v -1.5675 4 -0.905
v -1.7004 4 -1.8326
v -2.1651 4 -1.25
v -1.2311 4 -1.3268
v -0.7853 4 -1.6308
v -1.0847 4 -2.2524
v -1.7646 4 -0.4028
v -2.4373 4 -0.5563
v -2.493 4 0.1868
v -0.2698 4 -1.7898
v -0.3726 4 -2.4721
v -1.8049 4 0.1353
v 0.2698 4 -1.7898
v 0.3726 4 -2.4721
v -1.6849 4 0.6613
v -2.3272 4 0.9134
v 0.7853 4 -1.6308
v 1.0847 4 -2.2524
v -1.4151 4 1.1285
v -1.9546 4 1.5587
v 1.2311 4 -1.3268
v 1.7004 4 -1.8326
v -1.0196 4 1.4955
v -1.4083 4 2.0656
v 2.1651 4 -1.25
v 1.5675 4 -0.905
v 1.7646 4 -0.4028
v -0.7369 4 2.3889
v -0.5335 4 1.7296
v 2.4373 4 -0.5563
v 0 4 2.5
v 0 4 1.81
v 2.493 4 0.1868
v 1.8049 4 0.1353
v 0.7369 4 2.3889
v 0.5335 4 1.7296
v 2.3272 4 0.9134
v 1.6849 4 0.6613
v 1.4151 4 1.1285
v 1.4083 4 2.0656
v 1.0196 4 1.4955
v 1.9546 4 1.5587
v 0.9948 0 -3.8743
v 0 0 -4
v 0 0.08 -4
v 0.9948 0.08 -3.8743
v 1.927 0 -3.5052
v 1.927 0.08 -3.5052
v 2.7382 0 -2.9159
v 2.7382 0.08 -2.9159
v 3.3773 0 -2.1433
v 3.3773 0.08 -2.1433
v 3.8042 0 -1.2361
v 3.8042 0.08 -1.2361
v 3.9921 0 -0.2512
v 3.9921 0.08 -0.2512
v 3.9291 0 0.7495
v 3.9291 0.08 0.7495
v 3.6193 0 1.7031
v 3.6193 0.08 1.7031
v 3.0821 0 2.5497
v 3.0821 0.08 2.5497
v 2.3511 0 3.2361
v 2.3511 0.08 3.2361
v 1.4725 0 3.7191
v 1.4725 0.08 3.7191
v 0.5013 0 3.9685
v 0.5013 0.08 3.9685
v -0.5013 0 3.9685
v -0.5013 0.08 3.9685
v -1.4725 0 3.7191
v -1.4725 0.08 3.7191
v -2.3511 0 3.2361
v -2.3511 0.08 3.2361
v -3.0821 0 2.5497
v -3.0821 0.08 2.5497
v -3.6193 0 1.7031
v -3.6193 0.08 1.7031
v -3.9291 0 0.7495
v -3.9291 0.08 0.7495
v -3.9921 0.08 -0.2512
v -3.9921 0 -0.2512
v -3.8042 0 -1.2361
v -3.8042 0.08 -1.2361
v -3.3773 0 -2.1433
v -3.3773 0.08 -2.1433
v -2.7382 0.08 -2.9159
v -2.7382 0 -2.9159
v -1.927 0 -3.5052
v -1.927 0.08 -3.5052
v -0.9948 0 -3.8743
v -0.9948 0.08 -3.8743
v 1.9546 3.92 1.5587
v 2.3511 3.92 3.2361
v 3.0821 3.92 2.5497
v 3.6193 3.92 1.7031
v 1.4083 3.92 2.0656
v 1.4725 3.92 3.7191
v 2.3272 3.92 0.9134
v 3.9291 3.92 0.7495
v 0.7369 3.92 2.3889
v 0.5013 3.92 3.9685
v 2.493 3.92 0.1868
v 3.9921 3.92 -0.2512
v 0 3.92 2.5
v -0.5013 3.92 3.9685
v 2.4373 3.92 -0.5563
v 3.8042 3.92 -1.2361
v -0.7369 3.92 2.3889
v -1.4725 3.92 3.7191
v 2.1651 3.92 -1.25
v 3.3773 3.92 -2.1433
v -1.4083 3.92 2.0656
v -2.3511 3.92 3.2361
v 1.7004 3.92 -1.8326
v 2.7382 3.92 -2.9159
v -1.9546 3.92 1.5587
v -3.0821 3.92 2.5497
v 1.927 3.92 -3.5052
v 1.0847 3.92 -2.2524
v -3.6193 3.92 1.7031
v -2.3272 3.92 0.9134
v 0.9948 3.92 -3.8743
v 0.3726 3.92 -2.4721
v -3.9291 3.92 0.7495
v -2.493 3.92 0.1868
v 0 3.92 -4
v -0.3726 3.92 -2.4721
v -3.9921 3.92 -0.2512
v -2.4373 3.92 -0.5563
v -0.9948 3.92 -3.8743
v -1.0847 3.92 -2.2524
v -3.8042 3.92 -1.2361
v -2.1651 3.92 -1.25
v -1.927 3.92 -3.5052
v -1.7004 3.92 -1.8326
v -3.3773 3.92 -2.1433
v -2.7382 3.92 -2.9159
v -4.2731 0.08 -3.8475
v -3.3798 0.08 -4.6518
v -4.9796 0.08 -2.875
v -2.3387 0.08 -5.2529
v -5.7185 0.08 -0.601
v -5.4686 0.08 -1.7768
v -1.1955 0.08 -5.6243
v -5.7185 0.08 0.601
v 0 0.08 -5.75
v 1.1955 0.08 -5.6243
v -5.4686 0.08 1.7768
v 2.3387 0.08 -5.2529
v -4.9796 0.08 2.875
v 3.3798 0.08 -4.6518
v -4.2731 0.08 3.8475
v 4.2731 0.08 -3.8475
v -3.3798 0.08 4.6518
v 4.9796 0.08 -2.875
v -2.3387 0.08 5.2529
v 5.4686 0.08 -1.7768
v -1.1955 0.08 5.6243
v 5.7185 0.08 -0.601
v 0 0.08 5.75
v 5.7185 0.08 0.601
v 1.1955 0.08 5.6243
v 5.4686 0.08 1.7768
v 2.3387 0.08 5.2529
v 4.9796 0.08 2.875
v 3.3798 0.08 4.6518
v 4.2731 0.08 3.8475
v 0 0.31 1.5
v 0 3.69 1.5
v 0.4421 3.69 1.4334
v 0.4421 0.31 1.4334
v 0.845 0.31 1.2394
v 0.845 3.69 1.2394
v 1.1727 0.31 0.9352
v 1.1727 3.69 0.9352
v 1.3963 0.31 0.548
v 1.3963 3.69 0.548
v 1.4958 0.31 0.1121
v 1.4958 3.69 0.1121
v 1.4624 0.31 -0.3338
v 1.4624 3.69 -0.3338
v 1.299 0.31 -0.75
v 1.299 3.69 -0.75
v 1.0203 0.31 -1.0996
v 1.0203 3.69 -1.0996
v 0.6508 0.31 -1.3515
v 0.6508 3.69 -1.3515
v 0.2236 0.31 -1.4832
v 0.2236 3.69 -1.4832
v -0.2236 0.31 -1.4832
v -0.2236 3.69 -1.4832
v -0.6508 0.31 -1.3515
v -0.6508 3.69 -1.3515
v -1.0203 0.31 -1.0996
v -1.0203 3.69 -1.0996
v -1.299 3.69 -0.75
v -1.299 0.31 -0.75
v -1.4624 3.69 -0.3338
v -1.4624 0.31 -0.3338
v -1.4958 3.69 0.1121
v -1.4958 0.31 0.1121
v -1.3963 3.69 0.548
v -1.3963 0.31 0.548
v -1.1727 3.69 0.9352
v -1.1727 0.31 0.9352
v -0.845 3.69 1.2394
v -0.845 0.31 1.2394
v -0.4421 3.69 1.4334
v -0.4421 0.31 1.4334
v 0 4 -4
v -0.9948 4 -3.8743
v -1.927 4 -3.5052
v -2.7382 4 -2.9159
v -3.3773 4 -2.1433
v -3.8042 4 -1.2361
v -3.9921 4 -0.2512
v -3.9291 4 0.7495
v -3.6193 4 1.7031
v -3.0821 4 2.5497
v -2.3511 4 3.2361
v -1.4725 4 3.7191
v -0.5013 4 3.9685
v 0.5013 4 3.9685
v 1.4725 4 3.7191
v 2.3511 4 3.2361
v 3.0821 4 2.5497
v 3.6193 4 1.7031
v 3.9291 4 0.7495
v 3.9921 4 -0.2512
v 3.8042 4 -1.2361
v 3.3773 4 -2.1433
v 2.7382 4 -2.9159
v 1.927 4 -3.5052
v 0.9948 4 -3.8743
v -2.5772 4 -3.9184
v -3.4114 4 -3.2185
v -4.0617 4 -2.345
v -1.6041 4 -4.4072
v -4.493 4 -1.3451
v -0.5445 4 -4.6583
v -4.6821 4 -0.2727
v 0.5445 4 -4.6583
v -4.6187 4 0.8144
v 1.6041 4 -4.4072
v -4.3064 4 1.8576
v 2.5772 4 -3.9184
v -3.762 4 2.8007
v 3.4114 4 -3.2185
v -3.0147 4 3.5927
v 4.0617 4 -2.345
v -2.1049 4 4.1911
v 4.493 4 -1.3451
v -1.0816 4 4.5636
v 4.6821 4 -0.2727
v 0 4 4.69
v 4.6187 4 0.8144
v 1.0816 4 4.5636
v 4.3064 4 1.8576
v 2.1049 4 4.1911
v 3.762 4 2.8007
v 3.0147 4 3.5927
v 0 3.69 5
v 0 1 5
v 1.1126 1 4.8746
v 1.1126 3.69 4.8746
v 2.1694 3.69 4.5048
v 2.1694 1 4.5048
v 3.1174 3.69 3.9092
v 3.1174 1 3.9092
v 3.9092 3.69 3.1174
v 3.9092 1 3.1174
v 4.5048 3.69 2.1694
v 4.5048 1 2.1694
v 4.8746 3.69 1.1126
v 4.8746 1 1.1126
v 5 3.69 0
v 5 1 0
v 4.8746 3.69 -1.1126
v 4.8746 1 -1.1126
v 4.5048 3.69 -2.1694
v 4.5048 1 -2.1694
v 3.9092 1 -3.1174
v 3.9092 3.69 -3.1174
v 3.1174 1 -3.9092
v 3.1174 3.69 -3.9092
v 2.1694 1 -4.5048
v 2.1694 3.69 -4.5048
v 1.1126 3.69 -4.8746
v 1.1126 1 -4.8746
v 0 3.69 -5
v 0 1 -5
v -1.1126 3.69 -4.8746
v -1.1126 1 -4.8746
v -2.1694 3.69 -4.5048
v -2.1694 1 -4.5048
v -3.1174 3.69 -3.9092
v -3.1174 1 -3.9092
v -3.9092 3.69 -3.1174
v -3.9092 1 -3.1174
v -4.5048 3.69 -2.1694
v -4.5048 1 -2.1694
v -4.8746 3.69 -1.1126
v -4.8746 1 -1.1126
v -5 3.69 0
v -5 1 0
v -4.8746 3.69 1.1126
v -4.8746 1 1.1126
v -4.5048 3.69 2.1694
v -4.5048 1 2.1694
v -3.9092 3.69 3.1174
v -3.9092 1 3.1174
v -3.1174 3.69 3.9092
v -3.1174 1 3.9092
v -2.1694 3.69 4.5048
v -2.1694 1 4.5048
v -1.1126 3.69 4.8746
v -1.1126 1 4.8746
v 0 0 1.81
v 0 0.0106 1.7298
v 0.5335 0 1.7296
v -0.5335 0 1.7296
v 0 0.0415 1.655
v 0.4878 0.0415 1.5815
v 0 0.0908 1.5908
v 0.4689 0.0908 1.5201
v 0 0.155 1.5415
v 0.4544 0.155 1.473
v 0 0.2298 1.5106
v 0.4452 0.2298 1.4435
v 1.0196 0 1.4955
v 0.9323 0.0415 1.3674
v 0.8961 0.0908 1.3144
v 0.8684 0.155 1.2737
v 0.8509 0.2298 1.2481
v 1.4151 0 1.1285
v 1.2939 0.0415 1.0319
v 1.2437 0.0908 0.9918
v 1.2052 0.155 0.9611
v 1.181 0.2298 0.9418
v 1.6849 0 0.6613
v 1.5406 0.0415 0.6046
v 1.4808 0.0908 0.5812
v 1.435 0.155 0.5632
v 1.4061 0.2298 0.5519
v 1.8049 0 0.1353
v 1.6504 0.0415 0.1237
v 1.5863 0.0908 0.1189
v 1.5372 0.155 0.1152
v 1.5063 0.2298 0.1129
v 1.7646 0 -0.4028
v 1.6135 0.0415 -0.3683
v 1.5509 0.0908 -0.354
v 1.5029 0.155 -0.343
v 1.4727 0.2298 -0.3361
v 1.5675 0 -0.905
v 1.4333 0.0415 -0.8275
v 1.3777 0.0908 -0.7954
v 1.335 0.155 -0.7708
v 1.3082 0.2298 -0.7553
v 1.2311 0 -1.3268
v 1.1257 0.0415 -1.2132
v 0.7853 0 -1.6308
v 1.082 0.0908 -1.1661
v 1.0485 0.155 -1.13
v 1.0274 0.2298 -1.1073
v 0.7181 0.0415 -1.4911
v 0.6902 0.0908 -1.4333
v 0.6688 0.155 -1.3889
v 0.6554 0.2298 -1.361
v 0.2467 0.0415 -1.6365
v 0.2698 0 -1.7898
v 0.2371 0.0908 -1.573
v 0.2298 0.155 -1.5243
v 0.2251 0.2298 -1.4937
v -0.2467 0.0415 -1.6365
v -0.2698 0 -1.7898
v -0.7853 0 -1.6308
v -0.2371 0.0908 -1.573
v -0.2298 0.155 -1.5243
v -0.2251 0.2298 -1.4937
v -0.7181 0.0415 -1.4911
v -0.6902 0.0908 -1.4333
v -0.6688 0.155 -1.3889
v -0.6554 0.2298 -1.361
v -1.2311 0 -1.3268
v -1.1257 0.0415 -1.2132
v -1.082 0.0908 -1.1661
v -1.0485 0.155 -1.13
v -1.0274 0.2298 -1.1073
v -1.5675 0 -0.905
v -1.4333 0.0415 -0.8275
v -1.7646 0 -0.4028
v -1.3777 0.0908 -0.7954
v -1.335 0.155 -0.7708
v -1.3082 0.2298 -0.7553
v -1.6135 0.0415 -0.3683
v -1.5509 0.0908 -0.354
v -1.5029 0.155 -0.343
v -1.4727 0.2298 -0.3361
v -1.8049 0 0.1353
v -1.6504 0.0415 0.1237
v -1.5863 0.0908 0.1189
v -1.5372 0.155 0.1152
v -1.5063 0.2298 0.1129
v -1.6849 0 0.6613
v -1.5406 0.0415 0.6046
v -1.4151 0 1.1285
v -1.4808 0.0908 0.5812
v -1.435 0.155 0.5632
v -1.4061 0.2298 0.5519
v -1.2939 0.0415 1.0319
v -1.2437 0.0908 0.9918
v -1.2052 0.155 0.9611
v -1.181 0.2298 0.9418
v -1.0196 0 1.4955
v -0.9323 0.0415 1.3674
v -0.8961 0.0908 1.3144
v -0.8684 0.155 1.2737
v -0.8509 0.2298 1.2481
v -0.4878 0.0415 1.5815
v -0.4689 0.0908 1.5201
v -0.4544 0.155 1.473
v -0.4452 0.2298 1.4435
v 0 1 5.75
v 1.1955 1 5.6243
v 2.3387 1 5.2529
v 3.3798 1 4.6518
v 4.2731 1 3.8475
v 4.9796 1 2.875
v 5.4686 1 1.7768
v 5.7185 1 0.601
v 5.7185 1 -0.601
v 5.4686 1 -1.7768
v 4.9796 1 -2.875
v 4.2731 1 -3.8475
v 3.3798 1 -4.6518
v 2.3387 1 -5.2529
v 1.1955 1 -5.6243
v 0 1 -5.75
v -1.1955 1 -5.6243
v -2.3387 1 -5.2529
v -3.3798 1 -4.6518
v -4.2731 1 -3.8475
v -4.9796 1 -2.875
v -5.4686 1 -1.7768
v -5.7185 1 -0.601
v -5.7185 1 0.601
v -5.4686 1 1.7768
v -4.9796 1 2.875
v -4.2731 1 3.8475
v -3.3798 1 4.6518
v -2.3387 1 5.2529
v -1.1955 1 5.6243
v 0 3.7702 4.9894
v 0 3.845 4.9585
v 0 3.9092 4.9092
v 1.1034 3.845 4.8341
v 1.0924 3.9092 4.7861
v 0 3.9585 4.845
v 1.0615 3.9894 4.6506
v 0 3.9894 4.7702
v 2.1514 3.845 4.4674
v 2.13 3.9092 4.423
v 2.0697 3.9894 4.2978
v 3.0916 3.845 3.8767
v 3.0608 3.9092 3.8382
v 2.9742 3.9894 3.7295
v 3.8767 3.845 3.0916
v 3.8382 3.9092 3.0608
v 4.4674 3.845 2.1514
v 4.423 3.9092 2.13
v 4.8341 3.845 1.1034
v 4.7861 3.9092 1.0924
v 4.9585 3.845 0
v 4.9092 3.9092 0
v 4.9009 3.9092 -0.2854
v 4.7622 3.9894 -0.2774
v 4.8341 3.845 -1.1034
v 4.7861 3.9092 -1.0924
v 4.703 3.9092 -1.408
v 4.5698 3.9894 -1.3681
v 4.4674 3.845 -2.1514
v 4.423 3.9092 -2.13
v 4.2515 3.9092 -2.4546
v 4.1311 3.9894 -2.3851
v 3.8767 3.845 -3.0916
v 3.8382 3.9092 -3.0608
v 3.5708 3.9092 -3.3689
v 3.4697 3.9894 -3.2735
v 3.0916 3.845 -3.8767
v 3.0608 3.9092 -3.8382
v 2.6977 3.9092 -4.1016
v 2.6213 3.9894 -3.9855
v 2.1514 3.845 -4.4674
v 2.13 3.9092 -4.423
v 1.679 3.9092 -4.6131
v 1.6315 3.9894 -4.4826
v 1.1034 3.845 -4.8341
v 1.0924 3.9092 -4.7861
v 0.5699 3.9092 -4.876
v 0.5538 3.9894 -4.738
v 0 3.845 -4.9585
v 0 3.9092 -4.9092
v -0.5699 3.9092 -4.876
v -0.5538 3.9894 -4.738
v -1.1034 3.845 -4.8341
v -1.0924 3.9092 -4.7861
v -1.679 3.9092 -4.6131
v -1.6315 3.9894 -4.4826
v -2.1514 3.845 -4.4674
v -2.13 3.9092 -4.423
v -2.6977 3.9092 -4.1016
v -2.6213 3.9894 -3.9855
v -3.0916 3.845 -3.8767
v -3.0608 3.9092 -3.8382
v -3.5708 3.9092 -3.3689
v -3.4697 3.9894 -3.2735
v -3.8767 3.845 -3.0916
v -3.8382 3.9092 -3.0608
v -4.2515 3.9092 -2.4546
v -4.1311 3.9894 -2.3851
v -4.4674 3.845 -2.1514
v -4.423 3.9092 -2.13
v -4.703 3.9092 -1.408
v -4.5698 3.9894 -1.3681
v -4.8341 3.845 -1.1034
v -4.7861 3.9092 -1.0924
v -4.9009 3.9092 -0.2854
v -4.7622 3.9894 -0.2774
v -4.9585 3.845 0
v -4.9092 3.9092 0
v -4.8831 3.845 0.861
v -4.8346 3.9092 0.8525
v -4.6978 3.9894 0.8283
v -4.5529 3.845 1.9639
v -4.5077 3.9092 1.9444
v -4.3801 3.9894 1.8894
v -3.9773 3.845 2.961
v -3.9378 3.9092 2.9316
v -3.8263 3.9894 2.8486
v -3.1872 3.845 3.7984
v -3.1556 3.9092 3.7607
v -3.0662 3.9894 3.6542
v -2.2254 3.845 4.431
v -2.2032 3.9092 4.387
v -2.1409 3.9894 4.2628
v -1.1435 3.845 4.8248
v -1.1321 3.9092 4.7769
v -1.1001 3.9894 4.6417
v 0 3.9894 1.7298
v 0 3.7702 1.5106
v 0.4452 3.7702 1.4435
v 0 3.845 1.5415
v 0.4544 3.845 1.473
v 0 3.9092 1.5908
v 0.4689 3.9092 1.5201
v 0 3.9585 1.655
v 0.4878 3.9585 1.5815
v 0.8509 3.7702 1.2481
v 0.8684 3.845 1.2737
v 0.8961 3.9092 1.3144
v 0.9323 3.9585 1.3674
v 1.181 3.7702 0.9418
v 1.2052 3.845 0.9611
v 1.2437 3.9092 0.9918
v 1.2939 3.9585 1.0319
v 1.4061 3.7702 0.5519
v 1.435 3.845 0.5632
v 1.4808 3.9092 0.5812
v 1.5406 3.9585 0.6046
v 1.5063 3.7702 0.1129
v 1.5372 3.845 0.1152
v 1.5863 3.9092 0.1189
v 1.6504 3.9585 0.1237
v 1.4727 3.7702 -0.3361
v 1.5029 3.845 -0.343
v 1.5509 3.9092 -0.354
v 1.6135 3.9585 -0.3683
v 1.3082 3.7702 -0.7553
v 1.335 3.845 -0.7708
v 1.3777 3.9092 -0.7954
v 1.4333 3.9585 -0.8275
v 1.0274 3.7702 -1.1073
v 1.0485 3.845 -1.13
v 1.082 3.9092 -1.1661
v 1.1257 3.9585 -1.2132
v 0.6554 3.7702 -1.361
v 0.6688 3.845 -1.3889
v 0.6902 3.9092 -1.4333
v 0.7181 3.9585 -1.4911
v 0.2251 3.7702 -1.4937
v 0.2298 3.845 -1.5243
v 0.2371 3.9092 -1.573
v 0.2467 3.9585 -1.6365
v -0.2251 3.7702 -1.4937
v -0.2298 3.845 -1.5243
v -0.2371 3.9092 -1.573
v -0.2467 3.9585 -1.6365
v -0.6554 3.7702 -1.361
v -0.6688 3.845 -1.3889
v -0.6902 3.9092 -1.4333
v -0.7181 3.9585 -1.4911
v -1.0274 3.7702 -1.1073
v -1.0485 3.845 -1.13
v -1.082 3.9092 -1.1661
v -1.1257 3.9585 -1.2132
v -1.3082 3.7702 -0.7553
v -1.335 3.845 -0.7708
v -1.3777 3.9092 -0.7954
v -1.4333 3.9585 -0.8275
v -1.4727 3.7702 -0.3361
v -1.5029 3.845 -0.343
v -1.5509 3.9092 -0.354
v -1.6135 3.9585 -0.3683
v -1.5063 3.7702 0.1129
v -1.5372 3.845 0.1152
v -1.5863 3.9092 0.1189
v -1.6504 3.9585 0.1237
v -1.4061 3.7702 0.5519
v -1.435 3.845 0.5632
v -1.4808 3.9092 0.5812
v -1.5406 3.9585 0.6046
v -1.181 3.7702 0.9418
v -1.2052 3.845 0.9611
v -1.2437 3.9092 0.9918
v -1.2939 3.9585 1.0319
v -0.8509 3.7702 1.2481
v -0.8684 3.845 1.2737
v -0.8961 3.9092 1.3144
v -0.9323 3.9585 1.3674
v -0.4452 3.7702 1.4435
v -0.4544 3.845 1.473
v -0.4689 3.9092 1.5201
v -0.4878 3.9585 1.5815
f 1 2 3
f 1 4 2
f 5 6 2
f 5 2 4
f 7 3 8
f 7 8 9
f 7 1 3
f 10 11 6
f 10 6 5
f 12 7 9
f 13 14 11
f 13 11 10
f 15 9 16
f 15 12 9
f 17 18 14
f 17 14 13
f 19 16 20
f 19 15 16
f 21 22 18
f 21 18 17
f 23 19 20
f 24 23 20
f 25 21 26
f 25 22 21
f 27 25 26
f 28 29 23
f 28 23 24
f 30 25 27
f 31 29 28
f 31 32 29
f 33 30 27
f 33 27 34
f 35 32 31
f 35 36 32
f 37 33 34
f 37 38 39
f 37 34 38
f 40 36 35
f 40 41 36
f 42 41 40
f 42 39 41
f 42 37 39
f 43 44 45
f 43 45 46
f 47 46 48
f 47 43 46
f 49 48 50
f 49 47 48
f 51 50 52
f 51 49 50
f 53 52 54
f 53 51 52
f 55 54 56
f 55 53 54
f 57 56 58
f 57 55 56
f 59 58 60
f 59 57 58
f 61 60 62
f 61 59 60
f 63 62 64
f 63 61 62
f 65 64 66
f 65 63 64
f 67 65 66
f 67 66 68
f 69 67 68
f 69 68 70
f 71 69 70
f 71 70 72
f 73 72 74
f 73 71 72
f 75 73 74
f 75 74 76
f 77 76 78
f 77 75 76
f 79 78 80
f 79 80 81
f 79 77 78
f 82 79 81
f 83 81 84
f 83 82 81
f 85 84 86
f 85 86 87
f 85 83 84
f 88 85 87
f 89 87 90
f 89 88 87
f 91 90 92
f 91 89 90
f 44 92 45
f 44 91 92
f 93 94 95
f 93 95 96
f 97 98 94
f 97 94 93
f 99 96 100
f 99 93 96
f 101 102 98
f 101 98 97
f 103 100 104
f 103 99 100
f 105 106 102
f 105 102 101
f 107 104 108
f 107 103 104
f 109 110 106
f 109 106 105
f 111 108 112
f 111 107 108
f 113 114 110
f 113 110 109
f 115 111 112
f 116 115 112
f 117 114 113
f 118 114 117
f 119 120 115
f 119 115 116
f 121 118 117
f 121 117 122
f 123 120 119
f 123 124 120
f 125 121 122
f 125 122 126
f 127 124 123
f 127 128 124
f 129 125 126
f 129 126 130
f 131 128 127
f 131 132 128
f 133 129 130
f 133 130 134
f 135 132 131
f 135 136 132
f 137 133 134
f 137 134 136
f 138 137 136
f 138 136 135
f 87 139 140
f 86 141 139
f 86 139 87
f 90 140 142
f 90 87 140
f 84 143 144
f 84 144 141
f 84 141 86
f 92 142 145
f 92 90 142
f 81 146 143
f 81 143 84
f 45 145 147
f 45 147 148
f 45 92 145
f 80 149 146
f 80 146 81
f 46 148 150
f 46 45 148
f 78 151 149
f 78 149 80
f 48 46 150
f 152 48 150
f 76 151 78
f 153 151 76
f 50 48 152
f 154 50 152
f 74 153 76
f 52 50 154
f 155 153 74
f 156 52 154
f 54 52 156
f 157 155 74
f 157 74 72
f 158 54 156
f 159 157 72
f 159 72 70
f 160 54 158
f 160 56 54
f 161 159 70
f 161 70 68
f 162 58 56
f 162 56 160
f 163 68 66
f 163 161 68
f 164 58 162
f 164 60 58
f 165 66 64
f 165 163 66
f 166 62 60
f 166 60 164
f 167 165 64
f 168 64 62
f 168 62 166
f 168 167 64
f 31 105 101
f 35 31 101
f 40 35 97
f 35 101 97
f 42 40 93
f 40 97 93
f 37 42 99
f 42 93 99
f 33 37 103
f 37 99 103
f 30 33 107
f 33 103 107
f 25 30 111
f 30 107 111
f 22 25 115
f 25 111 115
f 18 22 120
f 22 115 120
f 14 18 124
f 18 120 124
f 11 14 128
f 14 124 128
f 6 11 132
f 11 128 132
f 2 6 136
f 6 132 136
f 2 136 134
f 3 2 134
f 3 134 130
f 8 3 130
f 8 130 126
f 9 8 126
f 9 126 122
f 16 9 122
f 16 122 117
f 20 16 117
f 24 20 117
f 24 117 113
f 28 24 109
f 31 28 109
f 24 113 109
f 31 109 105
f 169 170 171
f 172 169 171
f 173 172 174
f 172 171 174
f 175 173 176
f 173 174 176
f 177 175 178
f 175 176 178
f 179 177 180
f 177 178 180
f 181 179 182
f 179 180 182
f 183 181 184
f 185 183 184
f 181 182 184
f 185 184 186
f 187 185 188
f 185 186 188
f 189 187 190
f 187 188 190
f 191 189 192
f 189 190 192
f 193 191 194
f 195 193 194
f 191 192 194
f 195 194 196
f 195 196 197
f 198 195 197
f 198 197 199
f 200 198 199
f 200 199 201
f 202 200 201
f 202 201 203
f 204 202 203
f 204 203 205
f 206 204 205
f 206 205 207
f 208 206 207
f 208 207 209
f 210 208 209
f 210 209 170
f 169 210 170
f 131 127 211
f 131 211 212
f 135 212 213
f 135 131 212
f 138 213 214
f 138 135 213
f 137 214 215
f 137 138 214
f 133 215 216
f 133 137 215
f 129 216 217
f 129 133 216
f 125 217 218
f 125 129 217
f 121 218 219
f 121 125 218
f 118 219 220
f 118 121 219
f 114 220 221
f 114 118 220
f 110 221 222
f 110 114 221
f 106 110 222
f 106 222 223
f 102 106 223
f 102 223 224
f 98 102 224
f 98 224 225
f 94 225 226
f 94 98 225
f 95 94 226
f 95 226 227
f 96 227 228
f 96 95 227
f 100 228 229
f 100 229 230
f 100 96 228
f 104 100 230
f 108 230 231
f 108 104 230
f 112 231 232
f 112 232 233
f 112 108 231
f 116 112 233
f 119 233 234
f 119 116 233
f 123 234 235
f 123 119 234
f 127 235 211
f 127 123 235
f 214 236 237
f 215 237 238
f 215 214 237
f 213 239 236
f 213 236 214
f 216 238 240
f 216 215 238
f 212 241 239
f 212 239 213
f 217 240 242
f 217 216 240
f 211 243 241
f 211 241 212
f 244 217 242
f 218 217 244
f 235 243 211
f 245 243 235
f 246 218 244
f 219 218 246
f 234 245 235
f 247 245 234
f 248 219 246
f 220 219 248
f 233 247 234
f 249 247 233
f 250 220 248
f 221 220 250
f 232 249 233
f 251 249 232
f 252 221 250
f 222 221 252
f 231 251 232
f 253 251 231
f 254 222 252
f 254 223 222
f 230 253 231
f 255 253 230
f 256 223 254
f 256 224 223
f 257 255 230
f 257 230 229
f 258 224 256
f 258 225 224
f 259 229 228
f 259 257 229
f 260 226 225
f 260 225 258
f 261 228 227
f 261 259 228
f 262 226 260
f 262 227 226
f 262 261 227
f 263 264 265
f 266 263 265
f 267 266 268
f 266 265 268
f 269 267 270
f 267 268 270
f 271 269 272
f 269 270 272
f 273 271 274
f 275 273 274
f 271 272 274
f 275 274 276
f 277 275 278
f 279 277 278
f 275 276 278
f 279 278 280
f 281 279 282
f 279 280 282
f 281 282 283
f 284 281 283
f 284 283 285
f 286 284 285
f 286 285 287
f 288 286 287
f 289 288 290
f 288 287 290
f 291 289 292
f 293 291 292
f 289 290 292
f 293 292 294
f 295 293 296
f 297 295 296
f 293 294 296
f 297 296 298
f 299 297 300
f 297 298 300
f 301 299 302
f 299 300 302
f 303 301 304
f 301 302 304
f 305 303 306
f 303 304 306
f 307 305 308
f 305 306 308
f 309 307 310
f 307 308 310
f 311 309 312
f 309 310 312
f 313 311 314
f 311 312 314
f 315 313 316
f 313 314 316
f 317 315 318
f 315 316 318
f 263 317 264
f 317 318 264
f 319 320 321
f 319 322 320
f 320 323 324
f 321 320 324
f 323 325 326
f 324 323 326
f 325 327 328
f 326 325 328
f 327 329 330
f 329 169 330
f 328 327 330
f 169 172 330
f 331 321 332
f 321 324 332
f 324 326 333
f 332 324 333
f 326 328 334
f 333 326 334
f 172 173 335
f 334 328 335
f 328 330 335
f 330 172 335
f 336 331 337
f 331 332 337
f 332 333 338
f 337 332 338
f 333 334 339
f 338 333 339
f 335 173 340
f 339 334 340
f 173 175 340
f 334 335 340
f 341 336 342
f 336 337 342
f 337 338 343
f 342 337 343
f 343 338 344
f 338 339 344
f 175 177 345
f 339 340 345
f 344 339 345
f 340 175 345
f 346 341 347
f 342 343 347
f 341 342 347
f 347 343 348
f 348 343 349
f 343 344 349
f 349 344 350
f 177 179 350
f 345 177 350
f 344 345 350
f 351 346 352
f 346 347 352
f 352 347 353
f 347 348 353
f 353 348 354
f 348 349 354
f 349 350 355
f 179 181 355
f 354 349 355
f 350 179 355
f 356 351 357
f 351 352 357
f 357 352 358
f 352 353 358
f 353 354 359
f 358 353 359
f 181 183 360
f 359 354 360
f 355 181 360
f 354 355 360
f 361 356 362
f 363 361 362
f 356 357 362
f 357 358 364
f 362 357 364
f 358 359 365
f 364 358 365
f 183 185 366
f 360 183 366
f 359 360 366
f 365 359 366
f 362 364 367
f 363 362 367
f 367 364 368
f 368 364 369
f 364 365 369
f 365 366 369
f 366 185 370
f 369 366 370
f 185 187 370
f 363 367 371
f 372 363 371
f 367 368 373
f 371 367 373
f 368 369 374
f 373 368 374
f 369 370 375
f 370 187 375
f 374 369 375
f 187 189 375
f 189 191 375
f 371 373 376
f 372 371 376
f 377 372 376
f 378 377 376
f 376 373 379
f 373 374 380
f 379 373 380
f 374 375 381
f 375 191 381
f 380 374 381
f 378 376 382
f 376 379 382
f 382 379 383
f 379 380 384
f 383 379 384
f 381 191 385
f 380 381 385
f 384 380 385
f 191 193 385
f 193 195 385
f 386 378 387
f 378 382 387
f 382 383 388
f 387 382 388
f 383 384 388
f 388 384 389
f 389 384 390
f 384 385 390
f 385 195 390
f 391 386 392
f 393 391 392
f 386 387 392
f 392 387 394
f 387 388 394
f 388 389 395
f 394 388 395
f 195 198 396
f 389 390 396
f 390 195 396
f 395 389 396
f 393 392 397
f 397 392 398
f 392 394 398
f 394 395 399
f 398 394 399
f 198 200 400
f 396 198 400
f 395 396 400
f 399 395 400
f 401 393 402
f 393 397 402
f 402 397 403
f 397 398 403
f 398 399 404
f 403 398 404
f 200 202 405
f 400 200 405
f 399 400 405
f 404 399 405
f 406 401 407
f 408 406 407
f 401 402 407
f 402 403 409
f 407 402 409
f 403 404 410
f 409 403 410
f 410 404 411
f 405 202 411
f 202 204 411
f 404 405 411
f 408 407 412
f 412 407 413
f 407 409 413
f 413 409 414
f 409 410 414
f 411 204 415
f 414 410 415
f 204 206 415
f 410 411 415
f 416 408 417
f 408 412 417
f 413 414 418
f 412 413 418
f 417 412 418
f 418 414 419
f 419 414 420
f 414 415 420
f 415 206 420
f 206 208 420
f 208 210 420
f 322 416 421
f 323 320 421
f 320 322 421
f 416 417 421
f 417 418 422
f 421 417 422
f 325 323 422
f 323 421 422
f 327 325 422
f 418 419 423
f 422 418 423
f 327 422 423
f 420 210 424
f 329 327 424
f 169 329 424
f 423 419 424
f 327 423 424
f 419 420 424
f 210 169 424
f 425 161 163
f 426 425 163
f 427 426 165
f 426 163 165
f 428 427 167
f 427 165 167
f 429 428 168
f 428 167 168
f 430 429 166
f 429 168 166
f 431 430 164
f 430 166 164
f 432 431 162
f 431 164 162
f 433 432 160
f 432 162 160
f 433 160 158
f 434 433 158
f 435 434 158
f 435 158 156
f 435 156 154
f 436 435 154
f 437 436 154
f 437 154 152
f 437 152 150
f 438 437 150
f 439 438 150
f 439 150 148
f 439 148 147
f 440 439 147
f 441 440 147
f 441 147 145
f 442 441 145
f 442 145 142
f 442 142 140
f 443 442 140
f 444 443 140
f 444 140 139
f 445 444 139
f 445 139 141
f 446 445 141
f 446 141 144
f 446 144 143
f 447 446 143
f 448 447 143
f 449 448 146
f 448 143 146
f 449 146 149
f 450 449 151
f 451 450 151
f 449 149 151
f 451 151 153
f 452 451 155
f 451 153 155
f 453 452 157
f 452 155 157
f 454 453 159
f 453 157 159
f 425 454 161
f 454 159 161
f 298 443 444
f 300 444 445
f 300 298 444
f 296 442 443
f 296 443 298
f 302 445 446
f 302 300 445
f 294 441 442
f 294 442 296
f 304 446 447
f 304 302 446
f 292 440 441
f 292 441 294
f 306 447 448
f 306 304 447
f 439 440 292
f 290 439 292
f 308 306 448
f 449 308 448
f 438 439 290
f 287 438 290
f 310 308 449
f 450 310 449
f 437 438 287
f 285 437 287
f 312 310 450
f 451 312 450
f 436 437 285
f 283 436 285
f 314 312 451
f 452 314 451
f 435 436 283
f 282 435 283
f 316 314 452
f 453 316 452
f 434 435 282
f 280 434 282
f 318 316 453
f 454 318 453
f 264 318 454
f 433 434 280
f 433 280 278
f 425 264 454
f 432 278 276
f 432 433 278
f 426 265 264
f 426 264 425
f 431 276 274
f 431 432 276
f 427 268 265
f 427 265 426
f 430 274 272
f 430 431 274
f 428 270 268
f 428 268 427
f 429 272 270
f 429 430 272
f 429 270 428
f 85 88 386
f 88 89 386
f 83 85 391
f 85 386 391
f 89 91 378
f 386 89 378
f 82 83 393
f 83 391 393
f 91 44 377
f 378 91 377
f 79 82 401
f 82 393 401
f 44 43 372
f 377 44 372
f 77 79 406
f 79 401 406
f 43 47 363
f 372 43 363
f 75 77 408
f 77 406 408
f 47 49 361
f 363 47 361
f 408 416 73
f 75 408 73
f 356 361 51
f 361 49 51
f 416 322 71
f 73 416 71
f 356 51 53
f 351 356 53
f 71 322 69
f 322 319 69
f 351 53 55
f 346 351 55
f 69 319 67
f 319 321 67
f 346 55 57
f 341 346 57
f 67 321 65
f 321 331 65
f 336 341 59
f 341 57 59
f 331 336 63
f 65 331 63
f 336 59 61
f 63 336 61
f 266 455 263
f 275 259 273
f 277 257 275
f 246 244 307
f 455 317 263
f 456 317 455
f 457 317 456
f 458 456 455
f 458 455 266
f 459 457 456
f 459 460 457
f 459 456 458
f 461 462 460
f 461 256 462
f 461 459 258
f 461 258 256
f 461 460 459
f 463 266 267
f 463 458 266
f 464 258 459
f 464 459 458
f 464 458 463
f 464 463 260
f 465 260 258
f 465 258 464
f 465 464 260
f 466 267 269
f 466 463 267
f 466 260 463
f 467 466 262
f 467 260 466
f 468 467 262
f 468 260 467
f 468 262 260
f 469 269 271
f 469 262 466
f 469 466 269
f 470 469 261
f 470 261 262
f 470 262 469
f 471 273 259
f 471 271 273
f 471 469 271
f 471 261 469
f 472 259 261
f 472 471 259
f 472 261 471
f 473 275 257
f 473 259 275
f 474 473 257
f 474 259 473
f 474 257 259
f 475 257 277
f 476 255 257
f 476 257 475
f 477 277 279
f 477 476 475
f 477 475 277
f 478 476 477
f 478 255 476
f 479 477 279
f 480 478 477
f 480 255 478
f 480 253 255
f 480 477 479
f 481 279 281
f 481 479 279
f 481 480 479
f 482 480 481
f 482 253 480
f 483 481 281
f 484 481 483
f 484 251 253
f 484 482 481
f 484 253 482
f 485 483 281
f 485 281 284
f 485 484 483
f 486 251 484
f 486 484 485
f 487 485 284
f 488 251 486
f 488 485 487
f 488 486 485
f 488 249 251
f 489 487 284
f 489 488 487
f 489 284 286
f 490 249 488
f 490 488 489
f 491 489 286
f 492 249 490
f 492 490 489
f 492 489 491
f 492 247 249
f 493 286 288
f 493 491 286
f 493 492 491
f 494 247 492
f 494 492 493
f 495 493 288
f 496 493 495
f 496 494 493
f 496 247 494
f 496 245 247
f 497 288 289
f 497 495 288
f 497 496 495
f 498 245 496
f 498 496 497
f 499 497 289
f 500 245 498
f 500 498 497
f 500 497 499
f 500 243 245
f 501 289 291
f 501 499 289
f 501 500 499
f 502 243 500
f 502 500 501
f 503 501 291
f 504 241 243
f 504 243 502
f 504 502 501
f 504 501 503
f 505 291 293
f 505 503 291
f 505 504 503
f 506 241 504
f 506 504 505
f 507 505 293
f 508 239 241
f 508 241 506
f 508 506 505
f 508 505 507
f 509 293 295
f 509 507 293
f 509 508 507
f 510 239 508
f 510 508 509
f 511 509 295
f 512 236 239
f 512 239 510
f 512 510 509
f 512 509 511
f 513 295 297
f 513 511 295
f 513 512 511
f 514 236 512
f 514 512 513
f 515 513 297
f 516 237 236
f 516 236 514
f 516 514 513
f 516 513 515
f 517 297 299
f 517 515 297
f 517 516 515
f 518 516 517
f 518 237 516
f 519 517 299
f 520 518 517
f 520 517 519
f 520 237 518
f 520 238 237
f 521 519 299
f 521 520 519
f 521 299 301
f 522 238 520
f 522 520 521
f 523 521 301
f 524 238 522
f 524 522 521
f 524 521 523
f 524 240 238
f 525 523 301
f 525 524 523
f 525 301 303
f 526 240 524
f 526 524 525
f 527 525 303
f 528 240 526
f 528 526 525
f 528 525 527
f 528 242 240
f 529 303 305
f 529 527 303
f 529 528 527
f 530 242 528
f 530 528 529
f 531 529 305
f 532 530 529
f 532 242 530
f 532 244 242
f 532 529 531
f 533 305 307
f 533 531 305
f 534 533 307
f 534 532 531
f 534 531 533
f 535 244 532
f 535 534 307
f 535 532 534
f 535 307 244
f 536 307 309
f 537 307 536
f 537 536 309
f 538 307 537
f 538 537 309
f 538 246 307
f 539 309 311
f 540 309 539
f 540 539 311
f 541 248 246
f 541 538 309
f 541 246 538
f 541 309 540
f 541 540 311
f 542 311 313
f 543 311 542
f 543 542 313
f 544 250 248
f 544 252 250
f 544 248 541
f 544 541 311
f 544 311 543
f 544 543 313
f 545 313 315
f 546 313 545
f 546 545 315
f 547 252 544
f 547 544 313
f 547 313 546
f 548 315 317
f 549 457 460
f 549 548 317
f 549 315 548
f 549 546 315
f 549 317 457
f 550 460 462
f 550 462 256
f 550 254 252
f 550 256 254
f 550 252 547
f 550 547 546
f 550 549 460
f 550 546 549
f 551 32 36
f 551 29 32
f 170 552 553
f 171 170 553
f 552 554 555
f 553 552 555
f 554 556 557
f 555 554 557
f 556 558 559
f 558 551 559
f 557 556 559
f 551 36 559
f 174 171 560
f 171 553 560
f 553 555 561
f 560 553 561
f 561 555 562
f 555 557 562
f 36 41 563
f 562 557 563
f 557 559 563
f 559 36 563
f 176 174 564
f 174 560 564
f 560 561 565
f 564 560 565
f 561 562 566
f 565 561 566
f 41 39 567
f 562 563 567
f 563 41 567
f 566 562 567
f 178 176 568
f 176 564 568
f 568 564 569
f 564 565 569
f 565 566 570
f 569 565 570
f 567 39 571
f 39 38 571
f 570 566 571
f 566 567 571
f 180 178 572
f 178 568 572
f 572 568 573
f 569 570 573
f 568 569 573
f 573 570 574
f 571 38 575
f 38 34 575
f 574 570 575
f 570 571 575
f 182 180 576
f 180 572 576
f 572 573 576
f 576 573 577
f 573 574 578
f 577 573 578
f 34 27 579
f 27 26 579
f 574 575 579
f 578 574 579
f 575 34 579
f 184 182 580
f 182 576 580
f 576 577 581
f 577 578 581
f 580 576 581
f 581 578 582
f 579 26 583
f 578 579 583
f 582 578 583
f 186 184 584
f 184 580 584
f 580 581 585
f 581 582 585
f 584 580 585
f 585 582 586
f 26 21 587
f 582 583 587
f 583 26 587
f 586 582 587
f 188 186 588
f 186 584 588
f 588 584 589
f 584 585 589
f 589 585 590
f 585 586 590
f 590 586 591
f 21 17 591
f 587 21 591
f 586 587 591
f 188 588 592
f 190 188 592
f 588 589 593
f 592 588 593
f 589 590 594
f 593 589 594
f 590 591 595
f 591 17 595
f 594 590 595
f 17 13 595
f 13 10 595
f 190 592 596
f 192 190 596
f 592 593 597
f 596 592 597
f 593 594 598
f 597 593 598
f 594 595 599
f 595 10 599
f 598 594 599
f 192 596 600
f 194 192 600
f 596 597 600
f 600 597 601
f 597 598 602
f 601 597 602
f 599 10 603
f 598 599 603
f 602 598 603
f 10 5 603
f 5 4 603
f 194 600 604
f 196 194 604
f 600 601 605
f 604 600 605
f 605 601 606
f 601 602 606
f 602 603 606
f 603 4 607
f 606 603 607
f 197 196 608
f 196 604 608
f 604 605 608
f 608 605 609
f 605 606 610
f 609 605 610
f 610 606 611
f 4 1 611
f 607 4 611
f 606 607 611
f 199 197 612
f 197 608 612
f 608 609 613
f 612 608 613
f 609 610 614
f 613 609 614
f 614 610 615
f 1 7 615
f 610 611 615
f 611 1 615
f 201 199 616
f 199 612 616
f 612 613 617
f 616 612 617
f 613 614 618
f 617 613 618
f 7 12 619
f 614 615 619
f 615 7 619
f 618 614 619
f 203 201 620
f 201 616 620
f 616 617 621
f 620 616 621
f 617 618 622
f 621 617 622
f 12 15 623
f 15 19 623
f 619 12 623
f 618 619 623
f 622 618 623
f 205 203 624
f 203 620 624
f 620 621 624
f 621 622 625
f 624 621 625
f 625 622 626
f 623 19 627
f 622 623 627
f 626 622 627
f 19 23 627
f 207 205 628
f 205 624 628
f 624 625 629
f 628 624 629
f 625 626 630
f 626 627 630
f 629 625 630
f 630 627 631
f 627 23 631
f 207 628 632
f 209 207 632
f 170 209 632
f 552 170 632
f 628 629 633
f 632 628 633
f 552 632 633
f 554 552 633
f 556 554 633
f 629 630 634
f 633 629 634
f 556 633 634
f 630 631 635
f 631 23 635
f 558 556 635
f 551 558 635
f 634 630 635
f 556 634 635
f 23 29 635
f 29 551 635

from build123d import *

# Parameters (mm, degrees)
SKETCH1_R           = 5.75
BOSS_EXTRUDE1_DEPTH = 1
SKETCH2_R           = 5
BOSS_EXTRUDE2_DEPTH = 3
SKETCH3_R           = 1.5
CUT_EXTRUDE1_DEPTH  = 10.06228448
SKETCH4_R           = 762
SKETCH4_R_2         = 4
CUT_EXTRUDE2_DEPTH  = 0.08
CUT_EXTRUDE3_START  = -0.08
SKETCH5_R           = 4
SKETCH5_R_2         = 2.5
CUT_EXTRUDE3_DEPTH  = 0.08
FILLET1_R           = 0.31


with BuildPart() as part:
    # Sketch1 → Boss-Extrude1 (new body)
    with BuildSketch(Plane(origin=(0, 0, 0), x_dir=(1, 0, 0), z_dir=(0, 1, 0))):
        with Locations(Location((0, 0, 0), (0, 0, 270))):
            Circle(SKETCH1_R)
    extrude(amount=BOSS_EXTRUDE1_DEPTH)

    # Sketch2 → Boss-Extrude2 (add)
    with BuildSketch(Plane(origin=(0, 1, 0), x_dir=(1, 0, 0), z_dir=(0, 1, 0))):
        with Locations(Location((0, 0, 0), (0, 0, 270))):
            Circle(SKETCH2_R)
    extrude(amount=BOSS_EXTRUDE2_DEPTH)

    # Sketch3 → Cut-Extrude1 (cut, through all)
    with BuildSketch(Plane(origin=(0, 4, 0), x_dir=(1, 0, 0), z_dir=(0, 1, 0))):
        with Locations(Location((0, 0, 0), (0, 0, 270))):
            Circle(SKETCH3_R)
    extrude(amount=-CUT_EXTRUDE1_DEPTH, mode=Mode.SUBTRACT)

    # Sketch4 → Cut-Extrude2 (cut)
    with BuildSketch(Plane.XZ):
        Circle(SKETCH4_R)
        with Locations(Location((0, 0, 0), (0, 0, 270))):
            Circle(SKETCH4_R_2, mode=Mode.SUBTRACT)
    extrude(amount=-CUT_EXTRUDE2_DEPTH, mode=Mode.SUBTRACT)

    # Sketch5 → Cut-Extrude3 (cut)
    with BuildSketch(Plane(origin=(0, 4, 0), x_dir=(1, 0, 0), z_dir=(0, 1, 0)).offset(CUT_EXTRUDE3_START)):
        with Locations(Location((0, 0, 0), (0, 0, 90))):
            Circle(SKETCH5_R)
        with Locations(Location((0, 0, 0), (0, 0, 270))):
            Circle(SKETCH5_R_2, mode=Mode.SUBTRACT)
    extrude(amount=CUT_EXTRUDE3_DEPTH, mode=Mode.SUBTRACT)

    # Fillet1
    fillet1_edges = [part.edges().sort_by_distance(p)[0] for p in [
        (0, 0, -1.5),
        (0, 4, -1.5),
        (0, 4, -5),
    ]]
    fillet(fillet1_edges, radius=FILLET1_R)


solid = part.part
